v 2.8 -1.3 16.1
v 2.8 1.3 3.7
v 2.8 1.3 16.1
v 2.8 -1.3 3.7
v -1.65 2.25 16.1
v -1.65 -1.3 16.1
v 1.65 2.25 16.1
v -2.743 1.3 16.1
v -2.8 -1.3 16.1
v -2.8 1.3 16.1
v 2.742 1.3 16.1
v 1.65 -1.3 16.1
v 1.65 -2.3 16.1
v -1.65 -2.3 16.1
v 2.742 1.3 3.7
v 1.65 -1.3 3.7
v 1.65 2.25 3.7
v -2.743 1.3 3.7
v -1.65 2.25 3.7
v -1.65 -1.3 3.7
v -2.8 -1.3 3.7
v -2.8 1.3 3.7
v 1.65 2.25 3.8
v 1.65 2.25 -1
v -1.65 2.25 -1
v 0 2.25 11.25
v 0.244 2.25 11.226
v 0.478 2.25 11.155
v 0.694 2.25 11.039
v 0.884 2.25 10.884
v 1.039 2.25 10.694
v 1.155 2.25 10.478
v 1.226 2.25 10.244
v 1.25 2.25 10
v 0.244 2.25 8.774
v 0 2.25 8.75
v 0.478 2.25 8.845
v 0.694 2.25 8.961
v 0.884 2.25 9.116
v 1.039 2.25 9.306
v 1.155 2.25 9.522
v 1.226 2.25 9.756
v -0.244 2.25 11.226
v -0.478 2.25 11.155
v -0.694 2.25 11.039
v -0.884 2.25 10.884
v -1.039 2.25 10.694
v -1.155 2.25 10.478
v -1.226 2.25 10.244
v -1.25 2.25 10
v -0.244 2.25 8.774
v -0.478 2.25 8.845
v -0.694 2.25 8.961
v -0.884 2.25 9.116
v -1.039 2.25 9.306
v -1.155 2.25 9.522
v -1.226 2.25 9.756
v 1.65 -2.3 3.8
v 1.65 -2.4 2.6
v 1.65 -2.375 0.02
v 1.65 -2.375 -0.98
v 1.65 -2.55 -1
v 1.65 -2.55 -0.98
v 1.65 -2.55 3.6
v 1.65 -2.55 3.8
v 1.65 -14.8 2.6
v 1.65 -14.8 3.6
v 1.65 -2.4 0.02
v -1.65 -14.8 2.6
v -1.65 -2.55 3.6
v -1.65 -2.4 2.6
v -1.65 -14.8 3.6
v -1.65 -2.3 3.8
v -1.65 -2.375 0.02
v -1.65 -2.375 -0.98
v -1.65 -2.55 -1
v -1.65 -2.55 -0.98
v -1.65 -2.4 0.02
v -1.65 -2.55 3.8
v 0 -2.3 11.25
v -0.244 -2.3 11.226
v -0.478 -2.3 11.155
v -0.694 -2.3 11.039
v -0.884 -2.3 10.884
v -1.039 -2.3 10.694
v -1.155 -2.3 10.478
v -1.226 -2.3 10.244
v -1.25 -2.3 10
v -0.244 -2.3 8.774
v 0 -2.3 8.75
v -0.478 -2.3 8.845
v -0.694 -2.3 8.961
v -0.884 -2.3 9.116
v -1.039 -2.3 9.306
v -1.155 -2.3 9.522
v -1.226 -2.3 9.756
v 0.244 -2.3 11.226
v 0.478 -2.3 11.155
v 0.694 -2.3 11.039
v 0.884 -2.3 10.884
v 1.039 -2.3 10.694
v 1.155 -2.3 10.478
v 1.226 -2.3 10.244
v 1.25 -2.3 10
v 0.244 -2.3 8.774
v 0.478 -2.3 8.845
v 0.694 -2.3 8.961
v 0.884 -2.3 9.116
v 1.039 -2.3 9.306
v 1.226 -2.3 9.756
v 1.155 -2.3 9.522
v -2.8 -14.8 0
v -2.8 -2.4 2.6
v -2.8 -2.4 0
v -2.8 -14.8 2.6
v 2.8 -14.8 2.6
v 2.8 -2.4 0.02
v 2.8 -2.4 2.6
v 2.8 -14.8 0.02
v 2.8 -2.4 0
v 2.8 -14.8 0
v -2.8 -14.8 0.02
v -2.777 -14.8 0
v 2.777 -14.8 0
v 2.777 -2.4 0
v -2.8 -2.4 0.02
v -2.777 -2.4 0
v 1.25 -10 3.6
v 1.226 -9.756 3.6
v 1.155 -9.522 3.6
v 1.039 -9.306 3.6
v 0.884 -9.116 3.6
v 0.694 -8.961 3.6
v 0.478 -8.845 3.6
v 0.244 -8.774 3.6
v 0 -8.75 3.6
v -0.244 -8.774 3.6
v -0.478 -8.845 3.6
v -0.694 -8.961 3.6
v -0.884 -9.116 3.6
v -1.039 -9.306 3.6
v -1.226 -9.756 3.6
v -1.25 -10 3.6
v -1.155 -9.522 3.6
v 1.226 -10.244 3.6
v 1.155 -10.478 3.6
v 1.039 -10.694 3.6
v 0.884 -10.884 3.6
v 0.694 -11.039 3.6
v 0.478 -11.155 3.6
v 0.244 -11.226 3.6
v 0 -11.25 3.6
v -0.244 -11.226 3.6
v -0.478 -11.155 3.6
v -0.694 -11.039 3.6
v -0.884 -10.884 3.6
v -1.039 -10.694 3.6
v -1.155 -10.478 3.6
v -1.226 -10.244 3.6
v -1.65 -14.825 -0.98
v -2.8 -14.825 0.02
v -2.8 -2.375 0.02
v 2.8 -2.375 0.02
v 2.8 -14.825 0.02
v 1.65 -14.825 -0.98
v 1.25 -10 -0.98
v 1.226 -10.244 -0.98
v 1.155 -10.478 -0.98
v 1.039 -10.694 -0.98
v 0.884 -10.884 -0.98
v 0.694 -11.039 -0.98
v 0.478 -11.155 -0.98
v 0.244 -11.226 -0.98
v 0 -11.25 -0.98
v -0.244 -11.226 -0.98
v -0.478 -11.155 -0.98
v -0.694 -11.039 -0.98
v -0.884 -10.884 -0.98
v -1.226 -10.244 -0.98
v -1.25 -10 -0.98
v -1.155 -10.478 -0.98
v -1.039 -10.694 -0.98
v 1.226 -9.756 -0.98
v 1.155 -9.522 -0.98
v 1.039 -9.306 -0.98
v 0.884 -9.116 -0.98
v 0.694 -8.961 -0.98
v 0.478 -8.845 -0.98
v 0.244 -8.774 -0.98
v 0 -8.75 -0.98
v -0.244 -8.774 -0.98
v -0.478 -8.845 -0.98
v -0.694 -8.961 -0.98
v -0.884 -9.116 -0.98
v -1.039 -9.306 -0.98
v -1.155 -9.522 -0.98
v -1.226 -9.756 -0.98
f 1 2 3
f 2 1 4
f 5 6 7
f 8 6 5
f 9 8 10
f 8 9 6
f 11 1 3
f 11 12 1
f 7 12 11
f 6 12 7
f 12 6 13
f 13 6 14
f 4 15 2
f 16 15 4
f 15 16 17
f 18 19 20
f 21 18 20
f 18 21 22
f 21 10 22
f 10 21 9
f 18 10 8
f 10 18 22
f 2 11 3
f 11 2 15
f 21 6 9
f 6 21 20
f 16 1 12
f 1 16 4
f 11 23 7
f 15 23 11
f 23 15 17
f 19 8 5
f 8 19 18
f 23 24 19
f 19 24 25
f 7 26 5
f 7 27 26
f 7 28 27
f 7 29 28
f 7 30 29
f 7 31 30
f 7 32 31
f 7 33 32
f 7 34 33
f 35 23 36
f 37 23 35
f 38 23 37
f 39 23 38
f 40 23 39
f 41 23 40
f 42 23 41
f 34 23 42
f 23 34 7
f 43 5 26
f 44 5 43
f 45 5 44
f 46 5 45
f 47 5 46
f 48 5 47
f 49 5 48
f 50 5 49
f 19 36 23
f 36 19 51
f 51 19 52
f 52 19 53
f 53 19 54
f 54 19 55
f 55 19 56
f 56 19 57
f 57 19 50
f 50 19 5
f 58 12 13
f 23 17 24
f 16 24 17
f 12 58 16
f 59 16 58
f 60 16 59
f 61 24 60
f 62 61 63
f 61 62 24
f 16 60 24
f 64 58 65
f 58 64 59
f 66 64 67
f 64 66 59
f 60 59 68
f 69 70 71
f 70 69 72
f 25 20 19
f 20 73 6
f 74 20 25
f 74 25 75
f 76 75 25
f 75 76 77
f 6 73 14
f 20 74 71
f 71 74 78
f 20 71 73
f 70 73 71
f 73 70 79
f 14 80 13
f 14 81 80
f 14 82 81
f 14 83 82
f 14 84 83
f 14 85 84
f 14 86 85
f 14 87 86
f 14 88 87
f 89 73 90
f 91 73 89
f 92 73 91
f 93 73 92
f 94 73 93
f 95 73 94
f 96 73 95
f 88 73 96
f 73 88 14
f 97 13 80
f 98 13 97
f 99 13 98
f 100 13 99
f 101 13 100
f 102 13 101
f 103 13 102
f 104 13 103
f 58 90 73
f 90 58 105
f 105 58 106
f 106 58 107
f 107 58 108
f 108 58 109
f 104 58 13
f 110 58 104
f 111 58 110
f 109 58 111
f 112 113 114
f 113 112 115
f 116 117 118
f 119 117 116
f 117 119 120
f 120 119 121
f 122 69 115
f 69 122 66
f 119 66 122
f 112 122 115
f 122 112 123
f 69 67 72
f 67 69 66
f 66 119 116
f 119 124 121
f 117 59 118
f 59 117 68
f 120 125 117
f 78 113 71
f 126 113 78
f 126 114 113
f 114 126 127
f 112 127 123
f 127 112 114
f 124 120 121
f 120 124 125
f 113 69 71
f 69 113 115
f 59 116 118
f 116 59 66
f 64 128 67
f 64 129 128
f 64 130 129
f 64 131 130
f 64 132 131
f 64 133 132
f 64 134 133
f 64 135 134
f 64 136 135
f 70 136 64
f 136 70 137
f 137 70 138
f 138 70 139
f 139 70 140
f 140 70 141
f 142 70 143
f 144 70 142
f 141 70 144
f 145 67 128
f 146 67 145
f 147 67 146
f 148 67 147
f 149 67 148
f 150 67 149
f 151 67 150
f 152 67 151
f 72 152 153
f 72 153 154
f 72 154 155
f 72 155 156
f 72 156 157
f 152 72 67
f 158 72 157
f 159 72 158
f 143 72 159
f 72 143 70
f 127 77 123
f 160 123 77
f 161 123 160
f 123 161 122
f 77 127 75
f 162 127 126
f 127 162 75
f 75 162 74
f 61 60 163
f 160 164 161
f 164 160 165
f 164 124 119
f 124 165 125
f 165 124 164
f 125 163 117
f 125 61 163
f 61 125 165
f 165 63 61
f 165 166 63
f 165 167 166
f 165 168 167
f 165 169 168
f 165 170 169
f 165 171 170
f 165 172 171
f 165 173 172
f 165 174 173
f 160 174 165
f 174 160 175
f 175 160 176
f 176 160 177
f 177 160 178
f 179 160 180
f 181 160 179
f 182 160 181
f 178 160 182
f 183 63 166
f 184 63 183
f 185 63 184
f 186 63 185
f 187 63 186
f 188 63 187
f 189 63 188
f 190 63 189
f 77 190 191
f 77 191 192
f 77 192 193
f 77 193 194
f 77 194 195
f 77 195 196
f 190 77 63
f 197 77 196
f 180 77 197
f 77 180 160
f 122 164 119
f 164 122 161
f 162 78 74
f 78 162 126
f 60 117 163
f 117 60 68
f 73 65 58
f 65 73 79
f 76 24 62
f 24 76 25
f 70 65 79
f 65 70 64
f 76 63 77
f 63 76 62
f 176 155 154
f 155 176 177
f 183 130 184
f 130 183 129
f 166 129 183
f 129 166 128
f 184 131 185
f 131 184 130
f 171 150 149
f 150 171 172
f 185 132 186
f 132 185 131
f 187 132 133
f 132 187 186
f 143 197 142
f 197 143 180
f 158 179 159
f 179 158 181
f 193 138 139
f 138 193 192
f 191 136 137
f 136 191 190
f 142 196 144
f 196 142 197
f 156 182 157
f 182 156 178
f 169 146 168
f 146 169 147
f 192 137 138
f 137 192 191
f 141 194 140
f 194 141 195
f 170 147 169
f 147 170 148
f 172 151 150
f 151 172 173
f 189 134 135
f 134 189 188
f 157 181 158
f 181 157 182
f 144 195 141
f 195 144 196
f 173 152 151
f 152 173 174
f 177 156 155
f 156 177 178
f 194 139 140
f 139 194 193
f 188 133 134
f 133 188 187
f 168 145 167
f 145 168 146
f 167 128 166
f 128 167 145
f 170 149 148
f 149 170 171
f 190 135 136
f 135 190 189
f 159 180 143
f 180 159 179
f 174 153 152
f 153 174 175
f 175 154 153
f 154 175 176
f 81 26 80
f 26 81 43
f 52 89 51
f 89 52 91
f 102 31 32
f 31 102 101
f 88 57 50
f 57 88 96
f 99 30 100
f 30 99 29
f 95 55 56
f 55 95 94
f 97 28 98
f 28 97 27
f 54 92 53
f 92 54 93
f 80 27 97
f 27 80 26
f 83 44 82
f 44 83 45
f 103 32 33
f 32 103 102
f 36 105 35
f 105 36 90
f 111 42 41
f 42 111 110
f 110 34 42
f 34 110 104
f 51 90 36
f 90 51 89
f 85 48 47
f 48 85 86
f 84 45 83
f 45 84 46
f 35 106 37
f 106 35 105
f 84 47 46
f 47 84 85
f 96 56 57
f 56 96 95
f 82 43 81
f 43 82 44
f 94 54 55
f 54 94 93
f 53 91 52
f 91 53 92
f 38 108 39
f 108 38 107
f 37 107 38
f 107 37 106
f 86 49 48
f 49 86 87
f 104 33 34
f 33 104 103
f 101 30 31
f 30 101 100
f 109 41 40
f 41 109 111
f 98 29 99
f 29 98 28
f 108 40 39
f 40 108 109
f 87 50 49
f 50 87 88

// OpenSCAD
h = 15;

module m3nut() {
	cylinder(r=3.3,h=2.3,center=true,$fn=6);
}

module blindjoint() {

	difference() {
		union() {
			translate([0,0,h/2+2.6/2 + 1.1  ])
				cube([5.6 ,2.6,h-2.6], center=true);
			
			translate([-5.6/2,-1.1/2 +2.6/2 + 1/2 ,h/2+2.6/2 + 1.1 ])
				linear_extrude(height=h-2.6,center=true,convexity=10) 
					polygon(points=[[0,0],[1.15,1],[5.6-1.15,1],[5.6,0]], paths=[[0,1,2,3]]);

			translate([0,-2.6/2 - 1.1/2  + 0.1 ,h/2+1.1])
				cube([3.3 ,1.1,h], center=true);

			rotate([90,00,00])
				translate([0,(2.6/2),h/2+1.1])
				cube([5.6 ,2.6,h-2.6], center=true);

			rotate([90,00,00])
				translate([0,2.6+1.1/2 - 0.1  ,h/2 - 0.2])
					cube([3.3 ,1.1,h], center=true);

			rotate([90,180,00])
			translate([-5.6/2  ,-0.02,h/2+1.1  ])
				linear_extrude(height=h-2.6+0.05,center=true,convexity=10) 
					polygon(points=[[0,0],[1.15,1],[5.6-1.15,1],[5.6,0]], paths=[[0,1,2,3]]);

			translate([0,0-0.1  - 0.05,2.6/2+1.1/2 + 1/2 - 1.0  + 0.05 ])
			cube([3.3, 2.6+1.1+1.0 + 0.1, 2.6+1.1+1.0 + 0.1], center=true);

		}


//		translate([0,-10,2.6/2 - 1/2])
//		rotate([0,0,30])
//			cylinder(r=3.3,h=2.6+1.1 + 0.1,center=true,$fn=6);

		translate([0,-10,2.6/2 - 1/2 + 1.1 - 0.02])
			cylinder(r=1.25,h=2.6+1.1 + 3.0+ 0.1,center=true,$fn=32);
		
//		rotate([-90,0,180])
//		translate([0,-10,(2.6+1.1)/2  -1.1 - 2.6/2])
//		rotate([0,0,30])
//			cylinder(r=3.3,h=2.6+1.1 + 0.1,center=true,$fn=6);

		rotate([-90,0,180])
		translate([0,-10,-1.1/2 + 1.1])
			cylinder(r=1.25,h=2.6+1.1 + 3.0 + 0.1,center=true,$fn=32);


	}
}

blindjoint();
